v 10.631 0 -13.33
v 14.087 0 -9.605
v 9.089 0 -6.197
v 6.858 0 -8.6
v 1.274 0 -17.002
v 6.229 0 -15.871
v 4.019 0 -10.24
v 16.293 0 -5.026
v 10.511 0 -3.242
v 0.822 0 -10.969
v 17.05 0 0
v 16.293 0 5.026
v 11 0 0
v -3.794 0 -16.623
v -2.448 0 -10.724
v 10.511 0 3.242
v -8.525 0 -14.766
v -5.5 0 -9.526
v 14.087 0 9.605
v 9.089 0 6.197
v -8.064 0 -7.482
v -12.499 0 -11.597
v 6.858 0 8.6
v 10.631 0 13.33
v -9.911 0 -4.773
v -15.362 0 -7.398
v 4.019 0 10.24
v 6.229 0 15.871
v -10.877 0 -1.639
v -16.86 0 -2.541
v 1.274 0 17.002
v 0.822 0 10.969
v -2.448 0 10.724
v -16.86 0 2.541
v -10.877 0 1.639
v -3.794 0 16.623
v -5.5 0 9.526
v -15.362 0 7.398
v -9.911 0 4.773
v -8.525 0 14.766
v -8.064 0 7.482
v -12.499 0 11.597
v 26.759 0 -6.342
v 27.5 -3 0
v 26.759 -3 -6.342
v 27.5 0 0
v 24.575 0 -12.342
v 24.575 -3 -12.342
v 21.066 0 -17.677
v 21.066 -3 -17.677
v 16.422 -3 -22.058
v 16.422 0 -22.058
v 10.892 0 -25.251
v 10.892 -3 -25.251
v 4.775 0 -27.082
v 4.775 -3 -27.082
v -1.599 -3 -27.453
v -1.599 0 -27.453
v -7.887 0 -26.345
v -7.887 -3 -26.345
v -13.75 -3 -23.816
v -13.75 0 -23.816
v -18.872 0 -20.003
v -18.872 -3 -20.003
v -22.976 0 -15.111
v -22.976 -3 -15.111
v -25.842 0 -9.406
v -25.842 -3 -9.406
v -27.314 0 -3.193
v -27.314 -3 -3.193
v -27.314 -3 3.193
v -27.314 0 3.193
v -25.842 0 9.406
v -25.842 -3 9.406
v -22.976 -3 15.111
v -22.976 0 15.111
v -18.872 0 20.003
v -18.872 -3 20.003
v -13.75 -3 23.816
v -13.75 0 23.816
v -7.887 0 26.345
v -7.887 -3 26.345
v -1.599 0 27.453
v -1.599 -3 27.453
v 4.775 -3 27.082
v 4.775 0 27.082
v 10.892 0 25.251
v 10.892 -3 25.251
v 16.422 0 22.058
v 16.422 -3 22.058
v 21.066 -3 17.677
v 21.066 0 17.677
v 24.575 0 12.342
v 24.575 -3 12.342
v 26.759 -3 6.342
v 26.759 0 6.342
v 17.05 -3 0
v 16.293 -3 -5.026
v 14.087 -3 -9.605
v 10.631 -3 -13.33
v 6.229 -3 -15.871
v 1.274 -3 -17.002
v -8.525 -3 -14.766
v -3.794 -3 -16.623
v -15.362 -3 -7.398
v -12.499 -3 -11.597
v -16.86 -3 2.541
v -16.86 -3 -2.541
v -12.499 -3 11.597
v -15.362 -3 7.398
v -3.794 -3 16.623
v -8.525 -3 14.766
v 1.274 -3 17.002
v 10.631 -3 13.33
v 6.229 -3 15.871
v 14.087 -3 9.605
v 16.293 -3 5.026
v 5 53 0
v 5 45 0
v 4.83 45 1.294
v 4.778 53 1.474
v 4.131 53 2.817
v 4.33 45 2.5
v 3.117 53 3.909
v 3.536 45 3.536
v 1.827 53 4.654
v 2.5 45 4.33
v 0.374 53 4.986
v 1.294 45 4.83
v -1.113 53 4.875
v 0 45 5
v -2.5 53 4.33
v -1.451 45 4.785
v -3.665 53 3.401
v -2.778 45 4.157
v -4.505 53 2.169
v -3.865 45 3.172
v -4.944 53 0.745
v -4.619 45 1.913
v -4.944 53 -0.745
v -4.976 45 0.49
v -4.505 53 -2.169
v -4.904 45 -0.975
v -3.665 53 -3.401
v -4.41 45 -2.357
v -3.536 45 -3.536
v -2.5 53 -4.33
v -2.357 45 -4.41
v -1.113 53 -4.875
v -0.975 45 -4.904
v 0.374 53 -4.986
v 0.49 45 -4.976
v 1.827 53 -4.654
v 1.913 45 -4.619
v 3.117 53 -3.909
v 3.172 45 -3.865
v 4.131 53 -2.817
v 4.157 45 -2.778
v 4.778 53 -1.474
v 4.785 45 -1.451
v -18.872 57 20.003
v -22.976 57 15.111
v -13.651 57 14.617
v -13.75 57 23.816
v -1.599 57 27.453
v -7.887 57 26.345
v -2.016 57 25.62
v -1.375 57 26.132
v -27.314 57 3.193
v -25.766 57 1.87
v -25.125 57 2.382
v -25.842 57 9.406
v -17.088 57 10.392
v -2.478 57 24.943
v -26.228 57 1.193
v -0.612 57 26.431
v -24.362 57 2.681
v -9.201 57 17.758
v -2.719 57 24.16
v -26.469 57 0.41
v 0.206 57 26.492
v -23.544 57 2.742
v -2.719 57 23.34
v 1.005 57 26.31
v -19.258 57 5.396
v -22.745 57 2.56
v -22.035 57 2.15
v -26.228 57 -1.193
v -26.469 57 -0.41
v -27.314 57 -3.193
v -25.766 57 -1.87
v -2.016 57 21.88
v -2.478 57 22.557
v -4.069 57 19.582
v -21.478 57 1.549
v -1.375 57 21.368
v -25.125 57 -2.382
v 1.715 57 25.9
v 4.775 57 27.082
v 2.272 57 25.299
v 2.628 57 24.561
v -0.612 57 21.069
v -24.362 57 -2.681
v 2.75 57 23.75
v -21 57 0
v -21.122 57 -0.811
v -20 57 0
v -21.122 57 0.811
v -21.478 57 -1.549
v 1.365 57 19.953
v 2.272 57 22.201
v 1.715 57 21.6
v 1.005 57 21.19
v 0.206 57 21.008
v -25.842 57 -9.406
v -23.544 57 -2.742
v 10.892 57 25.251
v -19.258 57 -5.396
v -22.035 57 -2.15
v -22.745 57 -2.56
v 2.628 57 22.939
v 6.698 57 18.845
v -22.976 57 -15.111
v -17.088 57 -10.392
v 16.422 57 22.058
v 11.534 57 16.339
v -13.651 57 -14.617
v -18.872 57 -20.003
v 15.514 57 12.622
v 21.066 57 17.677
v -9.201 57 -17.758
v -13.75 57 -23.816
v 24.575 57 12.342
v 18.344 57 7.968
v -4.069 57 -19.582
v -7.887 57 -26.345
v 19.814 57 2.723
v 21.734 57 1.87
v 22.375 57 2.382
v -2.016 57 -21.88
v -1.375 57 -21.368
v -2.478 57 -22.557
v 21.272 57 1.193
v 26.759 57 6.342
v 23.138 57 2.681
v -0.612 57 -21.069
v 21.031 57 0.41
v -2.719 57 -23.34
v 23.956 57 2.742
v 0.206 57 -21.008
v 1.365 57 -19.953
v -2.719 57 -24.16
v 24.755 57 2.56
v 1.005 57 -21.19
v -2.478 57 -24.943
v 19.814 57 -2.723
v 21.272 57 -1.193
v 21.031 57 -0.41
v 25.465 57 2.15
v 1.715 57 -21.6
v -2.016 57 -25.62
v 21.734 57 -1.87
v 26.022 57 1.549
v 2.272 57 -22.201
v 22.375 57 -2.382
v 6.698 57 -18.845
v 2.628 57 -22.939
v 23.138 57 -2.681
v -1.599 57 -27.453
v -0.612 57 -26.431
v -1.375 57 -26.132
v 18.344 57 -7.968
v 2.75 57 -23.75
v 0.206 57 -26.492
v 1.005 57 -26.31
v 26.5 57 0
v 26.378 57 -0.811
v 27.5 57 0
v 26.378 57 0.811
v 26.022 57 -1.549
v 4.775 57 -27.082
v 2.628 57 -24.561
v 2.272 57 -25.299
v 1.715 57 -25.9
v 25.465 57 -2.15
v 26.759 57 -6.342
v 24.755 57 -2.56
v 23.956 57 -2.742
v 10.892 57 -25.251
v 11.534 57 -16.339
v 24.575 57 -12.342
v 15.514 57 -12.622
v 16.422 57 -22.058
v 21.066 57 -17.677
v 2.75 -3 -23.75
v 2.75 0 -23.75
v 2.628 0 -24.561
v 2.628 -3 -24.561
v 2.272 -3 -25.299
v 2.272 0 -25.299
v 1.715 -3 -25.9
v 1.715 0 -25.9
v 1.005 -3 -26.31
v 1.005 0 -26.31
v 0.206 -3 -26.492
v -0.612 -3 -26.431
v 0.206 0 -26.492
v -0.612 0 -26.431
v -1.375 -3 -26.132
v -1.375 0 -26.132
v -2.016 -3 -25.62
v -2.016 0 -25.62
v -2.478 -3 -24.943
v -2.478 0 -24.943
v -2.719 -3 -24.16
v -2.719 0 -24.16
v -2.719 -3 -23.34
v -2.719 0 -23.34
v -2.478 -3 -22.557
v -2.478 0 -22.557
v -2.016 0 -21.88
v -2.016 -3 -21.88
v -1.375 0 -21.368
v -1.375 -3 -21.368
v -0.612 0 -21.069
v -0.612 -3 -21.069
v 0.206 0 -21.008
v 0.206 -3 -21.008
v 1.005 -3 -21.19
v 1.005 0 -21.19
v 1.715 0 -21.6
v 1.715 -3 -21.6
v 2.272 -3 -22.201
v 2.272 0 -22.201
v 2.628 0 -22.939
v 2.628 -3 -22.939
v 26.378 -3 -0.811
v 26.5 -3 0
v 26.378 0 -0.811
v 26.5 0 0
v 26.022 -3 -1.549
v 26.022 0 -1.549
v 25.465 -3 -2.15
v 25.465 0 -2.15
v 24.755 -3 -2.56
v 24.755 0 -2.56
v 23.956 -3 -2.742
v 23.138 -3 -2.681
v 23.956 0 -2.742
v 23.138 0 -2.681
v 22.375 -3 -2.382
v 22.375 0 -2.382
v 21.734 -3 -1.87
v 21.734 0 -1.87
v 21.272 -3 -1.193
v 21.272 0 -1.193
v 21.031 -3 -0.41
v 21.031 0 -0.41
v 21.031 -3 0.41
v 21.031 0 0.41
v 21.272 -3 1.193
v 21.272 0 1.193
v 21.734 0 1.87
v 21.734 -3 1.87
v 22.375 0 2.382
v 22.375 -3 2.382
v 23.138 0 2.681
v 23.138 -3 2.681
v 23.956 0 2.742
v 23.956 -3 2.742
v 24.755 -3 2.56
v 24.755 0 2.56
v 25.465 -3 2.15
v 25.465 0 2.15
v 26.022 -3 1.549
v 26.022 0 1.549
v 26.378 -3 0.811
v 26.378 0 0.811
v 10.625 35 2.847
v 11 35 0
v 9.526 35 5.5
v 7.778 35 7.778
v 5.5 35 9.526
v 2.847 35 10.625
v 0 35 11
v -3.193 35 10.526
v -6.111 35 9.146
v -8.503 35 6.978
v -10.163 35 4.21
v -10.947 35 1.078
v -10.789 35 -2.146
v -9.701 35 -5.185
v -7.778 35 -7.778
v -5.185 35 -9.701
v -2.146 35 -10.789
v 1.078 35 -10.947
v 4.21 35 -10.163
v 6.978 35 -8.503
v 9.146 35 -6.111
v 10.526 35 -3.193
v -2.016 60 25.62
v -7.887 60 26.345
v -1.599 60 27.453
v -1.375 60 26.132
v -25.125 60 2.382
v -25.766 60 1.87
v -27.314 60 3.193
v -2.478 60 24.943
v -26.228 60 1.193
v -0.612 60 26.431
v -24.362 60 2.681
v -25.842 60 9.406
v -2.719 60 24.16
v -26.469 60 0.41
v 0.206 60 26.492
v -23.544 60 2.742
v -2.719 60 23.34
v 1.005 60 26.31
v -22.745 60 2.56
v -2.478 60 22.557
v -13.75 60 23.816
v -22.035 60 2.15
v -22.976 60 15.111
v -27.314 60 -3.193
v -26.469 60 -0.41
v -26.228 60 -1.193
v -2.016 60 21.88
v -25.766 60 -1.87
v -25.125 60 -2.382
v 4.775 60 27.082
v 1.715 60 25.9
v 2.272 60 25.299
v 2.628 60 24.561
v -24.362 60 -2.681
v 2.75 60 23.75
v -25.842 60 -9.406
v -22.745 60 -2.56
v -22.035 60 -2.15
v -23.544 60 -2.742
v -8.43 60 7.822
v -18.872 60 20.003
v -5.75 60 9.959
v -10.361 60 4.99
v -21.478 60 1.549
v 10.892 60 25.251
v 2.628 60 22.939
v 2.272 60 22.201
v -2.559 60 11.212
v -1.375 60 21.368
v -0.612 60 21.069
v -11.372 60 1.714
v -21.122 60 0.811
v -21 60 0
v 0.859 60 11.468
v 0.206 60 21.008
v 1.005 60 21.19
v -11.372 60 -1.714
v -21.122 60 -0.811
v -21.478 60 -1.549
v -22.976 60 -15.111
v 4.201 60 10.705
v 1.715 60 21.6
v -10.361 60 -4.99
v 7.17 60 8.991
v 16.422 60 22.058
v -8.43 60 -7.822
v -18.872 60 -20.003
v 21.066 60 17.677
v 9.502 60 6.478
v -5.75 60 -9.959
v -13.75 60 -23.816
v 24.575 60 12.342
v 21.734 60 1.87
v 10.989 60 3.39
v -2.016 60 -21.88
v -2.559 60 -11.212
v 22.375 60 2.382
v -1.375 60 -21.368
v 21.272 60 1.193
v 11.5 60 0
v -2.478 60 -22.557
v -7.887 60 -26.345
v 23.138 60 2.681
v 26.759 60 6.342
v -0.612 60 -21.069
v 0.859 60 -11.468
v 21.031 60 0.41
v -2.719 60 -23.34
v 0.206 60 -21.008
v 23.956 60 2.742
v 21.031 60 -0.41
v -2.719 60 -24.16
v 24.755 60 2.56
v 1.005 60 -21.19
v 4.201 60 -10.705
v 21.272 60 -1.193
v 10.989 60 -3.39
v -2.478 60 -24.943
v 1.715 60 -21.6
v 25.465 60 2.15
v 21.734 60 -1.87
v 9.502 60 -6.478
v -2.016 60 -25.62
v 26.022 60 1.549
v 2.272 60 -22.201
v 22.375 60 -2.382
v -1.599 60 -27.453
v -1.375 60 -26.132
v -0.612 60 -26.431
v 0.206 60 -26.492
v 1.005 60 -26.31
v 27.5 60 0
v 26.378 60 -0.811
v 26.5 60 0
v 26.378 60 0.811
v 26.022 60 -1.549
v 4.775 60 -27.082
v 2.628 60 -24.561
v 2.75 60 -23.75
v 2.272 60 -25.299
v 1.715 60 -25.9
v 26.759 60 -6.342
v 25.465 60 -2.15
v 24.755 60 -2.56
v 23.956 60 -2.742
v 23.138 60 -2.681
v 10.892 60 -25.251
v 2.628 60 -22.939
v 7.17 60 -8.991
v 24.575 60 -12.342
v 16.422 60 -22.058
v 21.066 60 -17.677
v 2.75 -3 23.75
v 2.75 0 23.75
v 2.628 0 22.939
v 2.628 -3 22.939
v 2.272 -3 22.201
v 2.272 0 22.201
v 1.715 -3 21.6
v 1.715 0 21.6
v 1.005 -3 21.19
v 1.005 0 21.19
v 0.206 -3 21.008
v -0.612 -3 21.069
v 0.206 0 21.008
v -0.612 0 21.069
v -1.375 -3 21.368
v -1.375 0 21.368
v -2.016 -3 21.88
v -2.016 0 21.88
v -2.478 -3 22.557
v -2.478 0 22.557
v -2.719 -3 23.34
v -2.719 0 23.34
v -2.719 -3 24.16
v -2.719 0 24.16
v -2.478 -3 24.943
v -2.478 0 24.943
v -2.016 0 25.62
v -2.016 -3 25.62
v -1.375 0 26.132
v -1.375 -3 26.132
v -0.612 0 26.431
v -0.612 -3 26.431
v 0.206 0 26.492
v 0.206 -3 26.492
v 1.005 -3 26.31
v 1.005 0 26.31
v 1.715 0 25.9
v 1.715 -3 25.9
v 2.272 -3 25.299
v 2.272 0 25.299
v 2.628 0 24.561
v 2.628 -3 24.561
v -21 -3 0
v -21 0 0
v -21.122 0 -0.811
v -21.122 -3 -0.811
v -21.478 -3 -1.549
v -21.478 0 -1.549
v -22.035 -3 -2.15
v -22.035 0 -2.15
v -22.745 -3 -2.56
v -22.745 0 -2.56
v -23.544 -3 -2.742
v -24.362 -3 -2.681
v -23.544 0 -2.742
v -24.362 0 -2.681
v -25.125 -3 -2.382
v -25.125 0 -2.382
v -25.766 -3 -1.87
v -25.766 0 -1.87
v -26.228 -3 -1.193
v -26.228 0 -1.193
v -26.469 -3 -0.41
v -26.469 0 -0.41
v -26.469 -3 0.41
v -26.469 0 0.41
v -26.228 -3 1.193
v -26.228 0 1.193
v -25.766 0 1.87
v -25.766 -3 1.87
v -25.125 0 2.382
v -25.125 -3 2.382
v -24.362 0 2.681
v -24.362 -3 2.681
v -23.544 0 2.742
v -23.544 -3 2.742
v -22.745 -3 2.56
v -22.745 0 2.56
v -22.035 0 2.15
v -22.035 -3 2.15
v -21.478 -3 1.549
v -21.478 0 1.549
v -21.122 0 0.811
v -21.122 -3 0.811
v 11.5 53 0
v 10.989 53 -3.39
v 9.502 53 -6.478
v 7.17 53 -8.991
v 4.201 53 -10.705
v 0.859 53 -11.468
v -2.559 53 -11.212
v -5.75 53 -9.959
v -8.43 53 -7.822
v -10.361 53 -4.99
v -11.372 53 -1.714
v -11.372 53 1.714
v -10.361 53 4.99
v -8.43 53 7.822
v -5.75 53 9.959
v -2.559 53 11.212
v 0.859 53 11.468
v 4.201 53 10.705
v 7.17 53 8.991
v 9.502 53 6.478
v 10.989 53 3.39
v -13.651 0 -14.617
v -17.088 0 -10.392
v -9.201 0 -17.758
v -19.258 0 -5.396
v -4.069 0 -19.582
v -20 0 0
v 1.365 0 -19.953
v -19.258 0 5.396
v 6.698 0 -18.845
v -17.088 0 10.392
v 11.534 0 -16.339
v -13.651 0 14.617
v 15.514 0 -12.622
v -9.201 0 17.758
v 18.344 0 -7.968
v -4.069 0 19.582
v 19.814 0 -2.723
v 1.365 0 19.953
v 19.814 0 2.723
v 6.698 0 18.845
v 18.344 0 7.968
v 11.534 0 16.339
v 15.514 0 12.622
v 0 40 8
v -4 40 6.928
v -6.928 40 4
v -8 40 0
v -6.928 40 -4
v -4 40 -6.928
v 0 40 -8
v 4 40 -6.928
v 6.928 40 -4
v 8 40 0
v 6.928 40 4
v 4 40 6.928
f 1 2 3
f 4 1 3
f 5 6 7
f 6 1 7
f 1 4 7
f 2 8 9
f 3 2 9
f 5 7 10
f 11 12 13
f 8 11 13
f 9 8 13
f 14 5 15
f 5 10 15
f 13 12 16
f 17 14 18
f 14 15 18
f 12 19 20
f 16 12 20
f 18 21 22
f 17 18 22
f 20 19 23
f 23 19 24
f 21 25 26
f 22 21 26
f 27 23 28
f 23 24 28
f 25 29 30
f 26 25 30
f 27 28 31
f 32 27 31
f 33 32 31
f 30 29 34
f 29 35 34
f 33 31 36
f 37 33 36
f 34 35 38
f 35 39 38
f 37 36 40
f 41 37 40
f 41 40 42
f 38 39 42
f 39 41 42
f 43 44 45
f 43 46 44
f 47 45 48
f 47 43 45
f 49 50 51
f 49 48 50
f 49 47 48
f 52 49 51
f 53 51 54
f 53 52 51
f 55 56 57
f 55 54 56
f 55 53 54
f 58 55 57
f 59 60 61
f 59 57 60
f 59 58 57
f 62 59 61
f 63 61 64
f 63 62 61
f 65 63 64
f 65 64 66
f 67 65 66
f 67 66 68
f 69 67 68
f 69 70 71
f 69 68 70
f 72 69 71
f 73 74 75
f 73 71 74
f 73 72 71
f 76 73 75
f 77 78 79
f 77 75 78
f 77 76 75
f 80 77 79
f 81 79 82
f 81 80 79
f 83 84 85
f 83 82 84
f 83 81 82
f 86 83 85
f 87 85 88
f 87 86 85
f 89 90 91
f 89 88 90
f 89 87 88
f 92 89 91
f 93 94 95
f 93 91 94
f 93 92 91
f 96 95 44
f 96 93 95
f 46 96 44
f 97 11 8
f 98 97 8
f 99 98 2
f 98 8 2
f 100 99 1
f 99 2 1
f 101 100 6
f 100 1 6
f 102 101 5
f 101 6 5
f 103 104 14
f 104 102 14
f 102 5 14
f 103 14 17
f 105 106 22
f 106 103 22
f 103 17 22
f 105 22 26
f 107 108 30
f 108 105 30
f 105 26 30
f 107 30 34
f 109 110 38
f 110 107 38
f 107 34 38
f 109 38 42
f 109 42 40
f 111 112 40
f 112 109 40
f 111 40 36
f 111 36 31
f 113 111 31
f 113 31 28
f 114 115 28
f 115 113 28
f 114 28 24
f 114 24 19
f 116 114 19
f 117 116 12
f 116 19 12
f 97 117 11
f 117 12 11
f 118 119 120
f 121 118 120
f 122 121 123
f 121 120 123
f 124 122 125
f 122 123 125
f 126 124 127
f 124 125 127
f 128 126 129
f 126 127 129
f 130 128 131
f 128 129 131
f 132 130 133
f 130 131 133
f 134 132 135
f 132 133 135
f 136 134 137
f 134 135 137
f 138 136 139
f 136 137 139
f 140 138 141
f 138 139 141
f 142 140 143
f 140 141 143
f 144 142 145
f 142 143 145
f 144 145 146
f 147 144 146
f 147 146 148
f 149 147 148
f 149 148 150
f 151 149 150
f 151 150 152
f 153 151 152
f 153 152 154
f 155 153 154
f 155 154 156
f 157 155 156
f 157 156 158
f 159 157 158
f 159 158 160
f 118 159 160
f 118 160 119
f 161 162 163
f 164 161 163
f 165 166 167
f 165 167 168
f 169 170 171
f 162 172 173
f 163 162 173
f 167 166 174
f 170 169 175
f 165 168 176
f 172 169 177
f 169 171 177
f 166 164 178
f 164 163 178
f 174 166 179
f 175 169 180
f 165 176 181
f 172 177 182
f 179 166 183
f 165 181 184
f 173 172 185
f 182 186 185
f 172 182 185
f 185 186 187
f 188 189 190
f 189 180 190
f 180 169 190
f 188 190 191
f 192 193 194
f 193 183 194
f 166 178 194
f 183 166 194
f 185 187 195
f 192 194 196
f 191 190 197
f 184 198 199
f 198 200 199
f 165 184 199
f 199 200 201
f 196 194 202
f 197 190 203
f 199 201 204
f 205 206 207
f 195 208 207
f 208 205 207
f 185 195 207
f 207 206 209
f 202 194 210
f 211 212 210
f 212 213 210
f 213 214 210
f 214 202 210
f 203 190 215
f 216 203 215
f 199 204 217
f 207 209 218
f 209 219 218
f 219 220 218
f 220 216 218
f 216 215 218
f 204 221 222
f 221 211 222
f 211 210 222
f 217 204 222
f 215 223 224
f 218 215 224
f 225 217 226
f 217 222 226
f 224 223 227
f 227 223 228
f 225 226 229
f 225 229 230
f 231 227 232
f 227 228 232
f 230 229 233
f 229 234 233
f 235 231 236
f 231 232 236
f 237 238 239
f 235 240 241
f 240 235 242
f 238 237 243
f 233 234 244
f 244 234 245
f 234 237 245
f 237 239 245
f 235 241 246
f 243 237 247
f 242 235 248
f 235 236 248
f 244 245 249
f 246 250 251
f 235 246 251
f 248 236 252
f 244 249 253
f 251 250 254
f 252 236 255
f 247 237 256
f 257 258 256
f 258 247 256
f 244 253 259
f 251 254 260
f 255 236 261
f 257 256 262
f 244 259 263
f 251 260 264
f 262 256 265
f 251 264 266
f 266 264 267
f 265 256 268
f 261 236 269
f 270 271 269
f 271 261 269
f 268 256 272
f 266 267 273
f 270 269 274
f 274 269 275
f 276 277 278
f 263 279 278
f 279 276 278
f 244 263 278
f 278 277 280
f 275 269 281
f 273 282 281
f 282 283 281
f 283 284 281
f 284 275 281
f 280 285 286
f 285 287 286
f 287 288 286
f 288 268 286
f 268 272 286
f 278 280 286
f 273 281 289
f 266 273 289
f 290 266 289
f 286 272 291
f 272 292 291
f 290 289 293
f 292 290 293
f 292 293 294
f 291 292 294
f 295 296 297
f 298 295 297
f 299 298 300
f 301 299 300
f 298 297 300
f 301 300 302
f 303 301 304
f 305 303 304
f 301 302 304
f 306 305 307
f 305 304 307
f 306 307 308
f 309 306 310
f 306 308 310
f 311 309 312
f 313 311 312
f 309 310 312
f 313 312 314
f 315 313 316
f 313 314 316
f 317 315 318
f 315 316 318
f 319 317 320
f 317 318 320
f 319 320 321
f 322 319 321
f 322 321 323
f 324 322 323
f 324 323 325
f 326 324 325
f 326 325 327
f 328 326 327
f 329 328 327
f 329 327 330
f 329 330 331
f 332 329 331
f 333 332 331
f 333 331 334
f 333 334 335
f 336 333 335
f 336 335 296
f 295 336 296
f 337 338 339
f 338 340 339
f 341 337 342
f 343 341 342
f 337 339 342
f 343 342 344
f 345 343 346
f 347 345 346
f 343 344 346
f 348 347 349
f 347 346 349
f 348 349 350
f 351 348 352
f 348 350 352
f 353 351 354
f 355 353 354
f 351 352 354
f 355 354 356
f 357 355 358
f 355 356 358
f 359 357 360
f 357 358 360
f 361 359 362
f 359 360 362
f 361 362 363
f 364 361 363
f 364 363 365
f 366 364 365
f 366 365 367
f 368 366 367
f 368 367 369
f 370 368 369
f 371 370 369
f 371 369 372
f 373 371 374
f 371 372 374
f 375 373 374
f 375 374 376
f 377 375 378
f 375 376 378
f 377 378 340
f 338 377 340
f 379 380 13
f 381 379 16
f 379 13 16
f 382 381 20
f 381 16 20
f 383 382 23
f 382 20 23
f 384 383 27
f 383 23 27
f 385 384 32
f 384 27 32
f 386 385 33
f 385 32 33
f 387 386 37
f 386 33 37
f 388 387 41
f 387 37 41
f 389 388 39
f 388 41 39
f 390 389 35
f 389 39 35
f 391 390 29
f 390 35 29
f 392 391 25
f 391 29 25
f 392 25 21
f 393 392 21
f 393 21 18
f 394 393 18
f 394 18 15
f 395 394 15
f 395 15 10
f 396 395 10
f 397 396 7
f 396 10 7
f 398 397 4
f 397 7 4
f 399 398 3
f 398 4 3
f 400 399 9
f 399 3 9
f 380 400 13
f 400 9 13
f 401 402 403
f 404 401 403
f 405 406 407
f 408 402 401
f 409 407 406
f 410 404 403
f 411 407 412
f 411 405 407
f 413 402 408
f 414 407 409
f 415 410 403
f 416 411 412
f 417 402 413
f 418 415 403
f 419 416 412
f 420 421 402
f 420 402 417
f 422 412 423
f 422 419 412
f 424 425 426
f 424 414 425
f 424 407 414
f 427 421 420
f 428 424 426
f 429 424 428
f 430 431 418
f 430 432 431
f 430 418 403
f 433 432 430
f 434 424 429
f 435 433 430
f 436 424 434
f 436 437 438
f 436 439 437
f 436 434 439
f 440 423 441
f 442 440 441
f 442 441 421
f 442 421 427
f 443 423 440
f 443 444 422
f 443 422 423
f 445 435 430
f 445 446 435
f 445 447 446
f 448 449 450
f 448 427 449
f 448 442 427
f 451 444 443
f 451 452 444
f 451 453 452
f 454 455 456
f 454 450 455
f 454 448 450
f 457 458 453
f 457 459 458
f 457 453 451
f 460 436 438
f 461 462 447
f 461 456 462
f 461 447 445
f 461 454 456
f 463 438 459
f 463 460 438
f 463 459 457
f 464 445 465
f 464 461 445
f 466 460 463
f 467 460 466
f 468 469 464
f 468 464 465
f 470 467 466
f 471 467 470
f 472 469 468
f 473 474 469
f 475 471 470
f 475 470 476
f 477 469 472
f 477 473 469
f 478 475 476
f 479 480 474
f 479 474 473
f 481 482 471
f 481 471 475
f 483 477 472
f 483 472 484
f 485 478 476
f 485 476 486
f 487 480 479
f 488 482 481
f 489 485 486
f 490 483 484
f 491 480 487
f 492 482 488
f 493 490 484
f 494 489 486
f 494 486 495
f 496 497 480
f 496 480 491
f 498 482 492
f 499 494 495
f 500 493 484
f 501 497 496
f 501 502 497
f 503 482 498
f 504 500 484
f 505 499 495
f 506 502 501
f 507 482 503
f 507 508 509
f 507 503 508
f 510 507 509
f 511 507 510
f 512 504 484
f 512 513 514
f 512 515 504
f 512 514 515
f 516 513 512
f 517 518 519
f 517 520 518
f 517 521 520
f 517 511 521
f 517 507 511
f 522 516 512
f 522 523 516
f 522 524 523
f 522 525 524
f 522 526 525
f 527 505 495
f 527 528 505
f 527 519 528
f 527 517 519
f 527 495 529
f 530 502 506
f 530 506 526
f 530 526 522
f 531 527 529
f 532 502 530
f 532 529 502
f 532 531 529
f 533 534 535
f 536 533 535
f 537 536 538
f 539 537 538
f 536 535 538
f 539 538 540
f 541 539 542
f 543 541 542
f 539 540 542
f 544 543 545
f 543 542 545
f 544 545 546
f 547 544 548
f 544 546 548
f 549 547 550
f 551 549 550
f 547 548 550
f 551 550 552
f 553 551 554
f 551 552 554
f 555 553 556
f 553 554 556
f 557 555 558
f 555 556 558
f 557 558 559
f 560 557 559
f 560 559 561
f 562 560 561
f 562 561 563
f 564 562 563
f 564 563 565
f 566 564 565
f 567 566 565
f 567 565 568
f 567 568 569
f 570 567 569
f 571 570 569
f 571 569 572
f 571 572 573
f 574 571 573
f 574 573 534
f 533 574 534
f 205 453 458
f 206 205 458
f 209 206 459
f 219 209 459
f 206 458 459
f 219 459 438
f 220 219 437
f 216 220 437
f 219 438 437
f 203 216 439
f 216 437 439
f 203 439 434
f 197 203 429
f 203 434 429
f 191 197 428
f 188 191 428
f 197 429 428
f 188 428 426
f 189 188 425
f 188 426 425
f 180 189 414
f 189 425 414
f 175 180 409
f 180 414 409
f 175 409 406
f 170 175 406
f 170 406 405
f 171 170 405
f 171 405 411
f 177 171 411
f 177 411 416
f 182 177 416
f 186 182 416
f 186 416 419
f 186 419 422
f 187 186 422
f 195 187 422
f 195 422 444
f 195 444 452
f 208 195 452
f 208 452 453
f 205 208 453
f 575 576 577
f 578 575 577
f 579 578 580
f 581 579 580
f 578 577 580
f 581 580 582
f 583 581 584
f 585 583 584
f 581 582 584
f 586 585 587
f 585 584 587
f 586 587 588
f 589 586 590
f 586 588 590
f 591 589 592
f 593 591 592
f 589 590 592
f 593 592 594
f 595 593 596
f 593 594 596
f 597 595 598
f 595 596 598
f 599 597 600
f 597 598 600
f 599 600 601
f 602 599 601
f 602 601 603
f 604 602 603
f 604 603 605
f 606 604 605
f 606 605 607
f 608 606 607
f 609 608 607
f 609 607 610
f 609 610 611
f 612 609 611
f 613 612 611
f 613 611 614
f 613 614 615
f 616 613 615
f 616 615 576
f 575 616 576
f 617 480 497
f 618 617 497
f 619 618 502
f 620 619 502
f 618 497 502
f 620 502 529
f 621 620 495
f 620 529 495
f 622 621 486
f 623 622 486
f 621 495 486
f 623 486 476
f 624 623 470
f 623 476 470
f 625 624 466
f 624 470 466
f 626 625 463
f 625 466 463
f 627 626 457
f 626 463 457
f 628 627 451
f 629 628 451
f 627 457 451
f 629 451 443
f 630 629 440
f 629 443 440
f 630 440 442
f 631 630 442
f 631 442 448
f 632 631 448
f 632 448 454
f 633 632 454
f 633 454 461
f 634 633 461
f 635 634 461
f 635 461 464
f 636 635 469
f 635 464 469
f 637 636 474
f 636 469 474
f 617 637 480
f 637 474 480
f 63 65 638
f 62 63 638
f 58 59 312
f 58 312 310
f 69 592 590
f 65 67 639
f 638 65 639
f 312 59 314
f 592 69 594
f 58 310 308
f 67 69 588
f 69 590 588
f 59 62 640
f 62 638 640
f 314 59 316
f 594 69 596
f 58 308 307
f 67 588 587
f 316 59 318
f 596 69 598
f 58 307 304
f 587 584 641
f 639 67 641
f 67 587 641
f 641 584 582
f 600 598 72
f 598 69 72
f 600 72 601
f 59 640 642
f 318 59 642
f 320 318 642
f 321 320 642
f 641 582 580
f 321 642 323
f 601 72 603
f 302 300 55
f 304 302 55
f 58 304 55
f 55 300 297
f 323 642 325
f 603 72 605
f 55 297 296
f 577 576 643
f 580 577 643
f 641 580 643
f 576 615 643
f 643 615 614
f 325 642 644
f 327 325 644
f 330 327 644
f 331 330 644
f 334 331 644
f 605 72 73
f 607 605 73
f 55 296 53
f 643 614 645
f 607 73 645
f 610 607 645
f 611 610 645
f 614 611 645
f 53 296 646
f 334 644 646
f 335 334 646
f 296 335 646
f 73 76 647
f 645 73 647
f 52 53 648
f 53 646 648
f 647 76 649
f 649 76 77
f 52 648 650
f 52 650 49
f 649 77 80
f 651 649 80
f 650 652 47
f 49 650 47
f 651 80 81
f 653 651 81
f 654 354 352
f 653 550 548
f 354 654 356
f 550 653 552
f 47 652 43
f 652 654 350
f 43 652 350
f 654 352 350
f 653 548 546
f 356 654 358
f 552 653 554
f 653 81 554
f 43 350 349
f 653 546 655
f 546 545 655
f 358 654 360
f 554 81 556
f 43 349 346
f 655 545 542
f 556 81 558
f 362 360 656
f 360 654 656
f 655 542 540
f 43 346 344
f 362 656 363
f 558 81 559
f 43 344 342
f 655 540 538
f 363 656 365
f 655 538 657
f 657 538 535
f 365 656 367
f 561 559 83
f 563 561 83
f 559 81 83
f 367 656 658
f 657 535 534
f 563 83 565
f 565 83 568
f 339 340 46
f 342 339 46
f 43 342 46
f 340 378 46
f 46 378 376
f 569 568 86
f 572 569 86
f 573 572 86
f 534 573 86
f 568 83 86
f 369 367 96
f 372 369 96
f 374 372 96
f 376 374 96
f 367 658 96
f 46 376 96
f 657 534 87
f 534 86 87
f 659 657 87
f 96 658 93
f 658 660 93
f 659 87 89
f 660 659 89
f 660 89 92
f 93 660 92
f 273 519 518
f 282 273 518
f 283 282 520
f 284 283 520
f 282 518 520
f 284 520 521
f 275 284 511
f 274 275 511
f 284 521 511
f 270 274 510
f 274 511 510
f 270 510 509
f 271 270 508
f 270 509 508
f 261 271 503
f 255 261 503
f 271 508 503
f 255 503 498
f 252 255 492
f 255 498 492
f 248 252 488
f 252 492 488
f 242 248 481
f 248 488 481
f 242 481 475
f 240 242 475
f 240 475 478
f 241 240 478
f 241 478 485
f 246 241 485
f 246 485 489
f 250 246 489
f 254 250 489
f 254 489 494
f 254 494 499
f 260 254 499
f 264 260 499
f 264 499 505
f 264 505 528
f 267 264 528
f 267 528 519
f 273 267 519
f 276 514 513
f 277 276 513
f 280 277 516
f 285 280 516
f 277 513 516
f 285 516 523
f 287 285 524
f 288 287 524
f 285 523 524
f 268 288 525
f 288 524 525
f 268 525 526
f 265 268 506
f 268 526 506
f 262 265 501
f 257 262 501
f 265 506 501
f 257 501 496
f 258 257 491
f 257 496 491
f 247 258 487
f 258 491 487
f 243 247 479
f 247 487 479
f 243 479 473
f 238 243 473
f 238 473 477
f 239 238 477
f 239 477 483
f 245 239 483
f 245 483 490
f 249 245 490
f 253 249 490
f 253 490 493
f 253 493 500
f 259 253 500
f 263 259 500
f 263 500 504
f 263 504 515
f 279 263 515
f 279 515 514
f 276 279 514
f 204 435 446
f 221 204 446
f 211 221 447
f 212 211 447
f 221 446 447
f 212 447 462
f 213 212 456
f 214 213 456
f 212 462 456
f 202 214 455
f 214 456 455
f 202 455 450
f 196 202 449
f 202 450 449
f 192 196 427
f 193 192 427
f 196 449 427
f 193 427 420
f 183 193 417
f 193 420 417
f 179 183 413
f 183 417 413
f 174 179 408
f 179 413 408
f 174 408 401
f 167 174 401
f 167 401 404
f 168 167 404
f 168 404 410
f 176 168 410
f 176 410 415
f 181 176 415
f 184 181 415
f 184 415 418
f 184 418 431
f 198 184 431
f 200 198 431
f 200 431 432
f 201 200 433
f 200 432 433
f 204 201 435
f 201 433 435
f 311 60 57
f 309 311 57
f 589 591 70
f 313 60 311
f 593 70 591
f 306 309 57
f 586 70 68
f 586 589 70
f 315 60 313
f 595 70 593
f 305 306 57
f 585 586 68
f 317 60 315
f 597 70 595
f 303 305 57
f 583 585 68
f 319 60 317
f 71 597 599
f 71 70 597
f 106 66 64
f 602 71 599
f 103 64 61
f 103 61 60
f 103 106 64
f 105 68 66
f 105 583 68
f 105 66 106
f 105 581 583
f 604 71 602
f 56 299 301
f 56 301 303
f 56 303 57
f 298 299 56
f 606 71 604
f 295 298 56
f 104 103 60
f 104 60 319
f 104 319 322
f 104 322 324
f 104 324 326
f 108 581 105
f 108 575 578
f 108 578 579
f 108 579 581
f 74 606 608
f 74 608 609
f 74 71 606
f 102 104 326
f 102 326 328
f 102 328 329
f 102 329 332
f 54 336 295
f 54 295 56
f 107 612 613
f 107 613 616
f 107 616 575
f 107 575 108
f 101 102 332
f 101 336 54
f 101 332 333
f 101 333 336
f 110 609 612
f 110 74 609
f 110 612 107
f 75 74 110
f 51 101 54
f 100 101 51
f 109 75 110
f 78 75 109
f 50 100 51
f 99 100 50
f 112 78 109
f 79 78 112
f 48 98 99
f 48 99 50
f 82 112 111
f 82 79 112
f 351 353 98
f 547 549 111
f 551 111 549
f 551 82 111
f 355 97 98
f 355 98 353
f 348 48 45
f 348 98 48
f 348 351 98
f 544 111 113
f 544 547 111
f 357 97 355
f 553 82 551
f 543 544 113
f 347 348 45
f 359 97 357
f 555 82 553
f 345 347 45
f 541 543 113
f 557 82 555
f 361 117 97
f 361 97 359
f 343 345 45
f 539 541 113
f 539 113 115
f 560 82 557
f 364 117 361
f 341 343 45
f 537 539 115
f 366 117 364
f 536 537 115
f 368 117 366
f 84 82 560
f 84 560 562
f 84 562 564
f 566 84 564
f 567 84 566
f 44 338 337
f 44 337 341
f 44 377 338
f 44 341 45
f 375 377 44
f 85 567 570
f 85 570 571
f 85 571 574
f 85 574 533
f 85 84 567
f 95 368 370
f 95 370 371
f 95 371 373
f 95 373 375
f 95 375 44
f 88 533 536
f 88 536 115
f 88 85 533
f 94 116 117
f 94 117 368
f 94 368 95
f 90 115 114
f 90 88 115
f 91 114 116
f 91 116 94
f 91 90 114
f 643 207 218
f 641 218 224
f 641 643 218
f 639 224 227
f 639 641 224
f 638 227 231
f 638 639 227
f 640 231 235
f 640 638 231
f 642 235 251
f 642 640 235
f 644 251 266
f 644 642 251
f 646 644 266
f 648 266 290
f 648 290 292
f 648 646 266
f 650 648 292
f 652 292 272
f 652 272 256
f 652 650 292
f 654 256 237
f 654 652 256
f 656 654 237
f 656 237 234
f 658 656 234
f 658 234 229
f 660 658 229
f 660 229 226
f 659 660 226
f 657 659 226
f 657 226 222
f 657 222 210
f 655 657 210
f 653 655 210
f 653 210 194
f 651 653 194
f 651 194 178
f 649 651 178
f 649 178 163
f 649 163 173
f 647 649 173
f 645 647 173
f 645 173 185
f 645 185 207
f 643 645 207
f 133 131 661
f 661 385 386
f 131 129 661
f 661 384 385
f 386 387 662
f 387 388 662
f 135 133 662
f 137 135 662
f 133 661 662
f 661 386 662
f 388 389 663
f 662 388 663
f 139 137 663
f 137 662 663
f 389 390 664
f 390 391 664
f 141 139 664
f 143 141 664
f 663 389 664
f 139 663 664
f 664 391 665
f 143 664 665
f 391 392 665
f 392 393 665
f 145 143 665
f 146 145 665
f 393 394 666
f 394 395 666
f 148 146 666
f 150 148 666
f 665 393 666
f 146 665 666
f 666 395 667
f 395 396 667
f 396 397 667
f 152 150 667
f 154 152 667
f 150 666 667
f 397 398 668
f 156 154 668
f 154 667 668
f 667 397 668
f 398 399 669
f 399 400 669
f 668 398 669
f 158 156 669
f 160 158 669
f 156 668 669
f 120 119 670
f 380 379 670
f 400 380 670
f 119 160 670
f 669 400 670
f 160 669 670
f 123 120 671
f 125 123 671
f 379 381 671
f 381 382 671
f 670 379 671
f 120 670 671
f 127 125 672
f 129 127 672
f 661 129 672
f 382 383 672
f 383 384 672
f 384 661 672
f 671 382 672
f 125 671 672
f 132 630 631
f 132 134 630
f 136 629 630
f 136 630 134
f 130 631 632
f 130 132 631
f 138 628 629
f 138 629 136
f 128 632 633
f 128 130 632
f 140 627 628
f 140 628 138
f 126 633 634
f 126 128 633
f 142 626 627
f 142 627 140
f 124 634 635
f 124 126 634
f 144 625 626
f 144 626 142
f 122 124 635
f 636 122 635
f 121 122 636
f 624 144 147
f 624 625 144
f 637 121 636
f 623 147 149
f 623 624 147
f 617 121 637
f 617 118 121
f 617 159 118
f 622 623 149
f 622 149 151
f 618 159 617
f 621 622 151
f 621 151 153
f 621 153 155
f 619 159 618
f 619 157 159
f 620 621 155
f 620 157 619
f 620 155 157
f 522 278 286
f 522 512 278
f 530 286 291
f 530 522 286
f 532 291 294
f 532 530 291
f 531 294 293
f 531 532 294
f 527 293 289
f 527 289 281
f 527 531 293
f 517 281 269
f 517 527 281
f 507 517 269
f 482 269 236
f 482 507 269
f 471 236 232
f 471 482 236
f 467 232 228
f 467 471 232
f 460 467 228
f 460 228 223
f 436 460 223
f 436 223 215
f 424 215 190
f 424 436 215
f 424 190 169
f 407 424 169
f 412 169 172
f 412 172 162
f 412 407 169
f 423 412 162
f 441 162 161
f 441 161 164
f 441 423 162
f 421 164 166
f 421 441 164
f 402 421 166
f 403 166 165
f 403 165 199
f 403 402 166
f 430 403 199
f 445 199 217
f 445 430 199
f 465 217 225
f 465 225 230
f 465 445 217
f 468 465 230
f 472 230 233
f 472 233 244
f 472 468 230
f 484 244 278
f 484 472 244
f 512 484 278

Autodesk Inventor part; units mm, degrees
ref_plane "YZ Plane" through (0, 0, 0) normal (1, 0, 0) x (0, 1, 0)
ref_plane "XZ Plane" through (0, 0, 0) normal (0, 1, 0) x (-1, 0, 0)
ref_plane "XY Plane" through (0, 0, 0) normal (0, 0, 1) x (1, 0, 0)
sketch "Boceto1" plane through (0, 0, 0) normal (0, 1, 0) x (-1, 0, 0)
  circle A0 centre (0, 0) radius 20
  dimension "d0" = 40
extrude "Extrusión1" add sketch "Boceto1" along normal blind 60
sketch "Boceto10" plane through (0, 0, 0) normal (0, -1, 0) x (1, 0, 0)
  circle A0 centre (0, 0) radius 11
  dimension "d34" = 22
extrude "Extrusión2" cut sketch "Boceto10" against normal blind 35
sketch "Boceto11" plane through (0, 0, 0) normal (1, 0, 0) x (0, 1, 0)
  line L0 (35, -11) -> (35, 11) projected
  line L1 (35, 0) -> (35, 11)
  line L2 (35, 0) -> (45, 0)
  line L3 (45, 0) -> (45, 5)
  line L4 (45, 5) -> (35, 11)
  point P0 (0, 0)
  dimension "d37" = 10
  dimension "d38" = 5
revolve "Revolución6" cut sketch "Boceto11" angle 360 about axis through (0, 35, 0) along (0, -1, 0)
sketch "Boceto12" plane through (0, 45, 0) normal (0, -1, 0) x (1, 0, 0)
  circle A0 centre (0, 0) radius 5
extrude "Extrusión3" cut sketch "Boceto12" against normal blind 35
sketch "Boceto13" plane through (0, 60, 0) normal (0, 1, 0) x (1, 0, 0)
  circle A0 centre (0, 0) radius 5 projected
  circle A1 centre (0, 0) radius 20
  dimension "d42" = 40
extrude "Extrusión4" cut sketch "Boceto13" against normal blind 1
sketch "Boceto14" plane through (0, 60, 0) normal (0, 1, 0) x (1, 0, 0)
  circle A0 centre (0, 0) radius 27.5
  dimension "d45" = 55
extrude "Extrusión5" add sketch "Boceto14" against normal blind 3
sketch "Boceto15" plane through (0, 57, 0) normal (0, -1, 0) x (1, 0, 0)
  circle A0 centre (0, 0) radius 11 projected
  circle A1 centre (0, 0) radius 5
extrude "Extrusión6" cut sketch "Boceto15" against normal blind 10 contours A1
sketch "Boceto16" plane through (0, 0, 0) normal (0, -1, 0) x (1, 0, 0)
  circle A0 centre (0, 0) radius 27.5
  circle A1 centre (0, 0) radius 17.05
  dimension "d50" = 34.1
extrude "Extrusión7" add sketch "Boceto16" along normal blind 3
sketch "Boceto17" plane through (0, 60, 0) normal (0, 1, 0) x (1, 0, 0)
  circle A0 centre (0, 0) radius 20
  circle A1 centre (0, 0) radius 27.5
  circle A2 centre (0, -23.75) radius 2.75
  circle A3 centre (-23.75, 0) radius 2.75
  circle A4 centre (0, 23.75) radius 2.75
  circle A5 centre (23.75, 0) radius 2.75
  dimension "d53" = 40
  dimension "d58" = 5.5
  dimension "d59" = 5.5
  dimension "d60" = 5.5
  dimension "d61" = 5.5
extrude "Extrusión8" cut sketch "Boceto17" against normal blind 100 contours A2 | A3 | A4 | A5
sketch "Boceto18" plane through (0, 60, 0) normal (0, 1, 0) x (1, 0, 0)
  circle A0 centre (0, 0) radius 11.5
  dimension "d64" = 23
extrude "Extrusión9" cut sketch "Boceto18" against normal blind 7
properties part number "cabezal extrusora"
